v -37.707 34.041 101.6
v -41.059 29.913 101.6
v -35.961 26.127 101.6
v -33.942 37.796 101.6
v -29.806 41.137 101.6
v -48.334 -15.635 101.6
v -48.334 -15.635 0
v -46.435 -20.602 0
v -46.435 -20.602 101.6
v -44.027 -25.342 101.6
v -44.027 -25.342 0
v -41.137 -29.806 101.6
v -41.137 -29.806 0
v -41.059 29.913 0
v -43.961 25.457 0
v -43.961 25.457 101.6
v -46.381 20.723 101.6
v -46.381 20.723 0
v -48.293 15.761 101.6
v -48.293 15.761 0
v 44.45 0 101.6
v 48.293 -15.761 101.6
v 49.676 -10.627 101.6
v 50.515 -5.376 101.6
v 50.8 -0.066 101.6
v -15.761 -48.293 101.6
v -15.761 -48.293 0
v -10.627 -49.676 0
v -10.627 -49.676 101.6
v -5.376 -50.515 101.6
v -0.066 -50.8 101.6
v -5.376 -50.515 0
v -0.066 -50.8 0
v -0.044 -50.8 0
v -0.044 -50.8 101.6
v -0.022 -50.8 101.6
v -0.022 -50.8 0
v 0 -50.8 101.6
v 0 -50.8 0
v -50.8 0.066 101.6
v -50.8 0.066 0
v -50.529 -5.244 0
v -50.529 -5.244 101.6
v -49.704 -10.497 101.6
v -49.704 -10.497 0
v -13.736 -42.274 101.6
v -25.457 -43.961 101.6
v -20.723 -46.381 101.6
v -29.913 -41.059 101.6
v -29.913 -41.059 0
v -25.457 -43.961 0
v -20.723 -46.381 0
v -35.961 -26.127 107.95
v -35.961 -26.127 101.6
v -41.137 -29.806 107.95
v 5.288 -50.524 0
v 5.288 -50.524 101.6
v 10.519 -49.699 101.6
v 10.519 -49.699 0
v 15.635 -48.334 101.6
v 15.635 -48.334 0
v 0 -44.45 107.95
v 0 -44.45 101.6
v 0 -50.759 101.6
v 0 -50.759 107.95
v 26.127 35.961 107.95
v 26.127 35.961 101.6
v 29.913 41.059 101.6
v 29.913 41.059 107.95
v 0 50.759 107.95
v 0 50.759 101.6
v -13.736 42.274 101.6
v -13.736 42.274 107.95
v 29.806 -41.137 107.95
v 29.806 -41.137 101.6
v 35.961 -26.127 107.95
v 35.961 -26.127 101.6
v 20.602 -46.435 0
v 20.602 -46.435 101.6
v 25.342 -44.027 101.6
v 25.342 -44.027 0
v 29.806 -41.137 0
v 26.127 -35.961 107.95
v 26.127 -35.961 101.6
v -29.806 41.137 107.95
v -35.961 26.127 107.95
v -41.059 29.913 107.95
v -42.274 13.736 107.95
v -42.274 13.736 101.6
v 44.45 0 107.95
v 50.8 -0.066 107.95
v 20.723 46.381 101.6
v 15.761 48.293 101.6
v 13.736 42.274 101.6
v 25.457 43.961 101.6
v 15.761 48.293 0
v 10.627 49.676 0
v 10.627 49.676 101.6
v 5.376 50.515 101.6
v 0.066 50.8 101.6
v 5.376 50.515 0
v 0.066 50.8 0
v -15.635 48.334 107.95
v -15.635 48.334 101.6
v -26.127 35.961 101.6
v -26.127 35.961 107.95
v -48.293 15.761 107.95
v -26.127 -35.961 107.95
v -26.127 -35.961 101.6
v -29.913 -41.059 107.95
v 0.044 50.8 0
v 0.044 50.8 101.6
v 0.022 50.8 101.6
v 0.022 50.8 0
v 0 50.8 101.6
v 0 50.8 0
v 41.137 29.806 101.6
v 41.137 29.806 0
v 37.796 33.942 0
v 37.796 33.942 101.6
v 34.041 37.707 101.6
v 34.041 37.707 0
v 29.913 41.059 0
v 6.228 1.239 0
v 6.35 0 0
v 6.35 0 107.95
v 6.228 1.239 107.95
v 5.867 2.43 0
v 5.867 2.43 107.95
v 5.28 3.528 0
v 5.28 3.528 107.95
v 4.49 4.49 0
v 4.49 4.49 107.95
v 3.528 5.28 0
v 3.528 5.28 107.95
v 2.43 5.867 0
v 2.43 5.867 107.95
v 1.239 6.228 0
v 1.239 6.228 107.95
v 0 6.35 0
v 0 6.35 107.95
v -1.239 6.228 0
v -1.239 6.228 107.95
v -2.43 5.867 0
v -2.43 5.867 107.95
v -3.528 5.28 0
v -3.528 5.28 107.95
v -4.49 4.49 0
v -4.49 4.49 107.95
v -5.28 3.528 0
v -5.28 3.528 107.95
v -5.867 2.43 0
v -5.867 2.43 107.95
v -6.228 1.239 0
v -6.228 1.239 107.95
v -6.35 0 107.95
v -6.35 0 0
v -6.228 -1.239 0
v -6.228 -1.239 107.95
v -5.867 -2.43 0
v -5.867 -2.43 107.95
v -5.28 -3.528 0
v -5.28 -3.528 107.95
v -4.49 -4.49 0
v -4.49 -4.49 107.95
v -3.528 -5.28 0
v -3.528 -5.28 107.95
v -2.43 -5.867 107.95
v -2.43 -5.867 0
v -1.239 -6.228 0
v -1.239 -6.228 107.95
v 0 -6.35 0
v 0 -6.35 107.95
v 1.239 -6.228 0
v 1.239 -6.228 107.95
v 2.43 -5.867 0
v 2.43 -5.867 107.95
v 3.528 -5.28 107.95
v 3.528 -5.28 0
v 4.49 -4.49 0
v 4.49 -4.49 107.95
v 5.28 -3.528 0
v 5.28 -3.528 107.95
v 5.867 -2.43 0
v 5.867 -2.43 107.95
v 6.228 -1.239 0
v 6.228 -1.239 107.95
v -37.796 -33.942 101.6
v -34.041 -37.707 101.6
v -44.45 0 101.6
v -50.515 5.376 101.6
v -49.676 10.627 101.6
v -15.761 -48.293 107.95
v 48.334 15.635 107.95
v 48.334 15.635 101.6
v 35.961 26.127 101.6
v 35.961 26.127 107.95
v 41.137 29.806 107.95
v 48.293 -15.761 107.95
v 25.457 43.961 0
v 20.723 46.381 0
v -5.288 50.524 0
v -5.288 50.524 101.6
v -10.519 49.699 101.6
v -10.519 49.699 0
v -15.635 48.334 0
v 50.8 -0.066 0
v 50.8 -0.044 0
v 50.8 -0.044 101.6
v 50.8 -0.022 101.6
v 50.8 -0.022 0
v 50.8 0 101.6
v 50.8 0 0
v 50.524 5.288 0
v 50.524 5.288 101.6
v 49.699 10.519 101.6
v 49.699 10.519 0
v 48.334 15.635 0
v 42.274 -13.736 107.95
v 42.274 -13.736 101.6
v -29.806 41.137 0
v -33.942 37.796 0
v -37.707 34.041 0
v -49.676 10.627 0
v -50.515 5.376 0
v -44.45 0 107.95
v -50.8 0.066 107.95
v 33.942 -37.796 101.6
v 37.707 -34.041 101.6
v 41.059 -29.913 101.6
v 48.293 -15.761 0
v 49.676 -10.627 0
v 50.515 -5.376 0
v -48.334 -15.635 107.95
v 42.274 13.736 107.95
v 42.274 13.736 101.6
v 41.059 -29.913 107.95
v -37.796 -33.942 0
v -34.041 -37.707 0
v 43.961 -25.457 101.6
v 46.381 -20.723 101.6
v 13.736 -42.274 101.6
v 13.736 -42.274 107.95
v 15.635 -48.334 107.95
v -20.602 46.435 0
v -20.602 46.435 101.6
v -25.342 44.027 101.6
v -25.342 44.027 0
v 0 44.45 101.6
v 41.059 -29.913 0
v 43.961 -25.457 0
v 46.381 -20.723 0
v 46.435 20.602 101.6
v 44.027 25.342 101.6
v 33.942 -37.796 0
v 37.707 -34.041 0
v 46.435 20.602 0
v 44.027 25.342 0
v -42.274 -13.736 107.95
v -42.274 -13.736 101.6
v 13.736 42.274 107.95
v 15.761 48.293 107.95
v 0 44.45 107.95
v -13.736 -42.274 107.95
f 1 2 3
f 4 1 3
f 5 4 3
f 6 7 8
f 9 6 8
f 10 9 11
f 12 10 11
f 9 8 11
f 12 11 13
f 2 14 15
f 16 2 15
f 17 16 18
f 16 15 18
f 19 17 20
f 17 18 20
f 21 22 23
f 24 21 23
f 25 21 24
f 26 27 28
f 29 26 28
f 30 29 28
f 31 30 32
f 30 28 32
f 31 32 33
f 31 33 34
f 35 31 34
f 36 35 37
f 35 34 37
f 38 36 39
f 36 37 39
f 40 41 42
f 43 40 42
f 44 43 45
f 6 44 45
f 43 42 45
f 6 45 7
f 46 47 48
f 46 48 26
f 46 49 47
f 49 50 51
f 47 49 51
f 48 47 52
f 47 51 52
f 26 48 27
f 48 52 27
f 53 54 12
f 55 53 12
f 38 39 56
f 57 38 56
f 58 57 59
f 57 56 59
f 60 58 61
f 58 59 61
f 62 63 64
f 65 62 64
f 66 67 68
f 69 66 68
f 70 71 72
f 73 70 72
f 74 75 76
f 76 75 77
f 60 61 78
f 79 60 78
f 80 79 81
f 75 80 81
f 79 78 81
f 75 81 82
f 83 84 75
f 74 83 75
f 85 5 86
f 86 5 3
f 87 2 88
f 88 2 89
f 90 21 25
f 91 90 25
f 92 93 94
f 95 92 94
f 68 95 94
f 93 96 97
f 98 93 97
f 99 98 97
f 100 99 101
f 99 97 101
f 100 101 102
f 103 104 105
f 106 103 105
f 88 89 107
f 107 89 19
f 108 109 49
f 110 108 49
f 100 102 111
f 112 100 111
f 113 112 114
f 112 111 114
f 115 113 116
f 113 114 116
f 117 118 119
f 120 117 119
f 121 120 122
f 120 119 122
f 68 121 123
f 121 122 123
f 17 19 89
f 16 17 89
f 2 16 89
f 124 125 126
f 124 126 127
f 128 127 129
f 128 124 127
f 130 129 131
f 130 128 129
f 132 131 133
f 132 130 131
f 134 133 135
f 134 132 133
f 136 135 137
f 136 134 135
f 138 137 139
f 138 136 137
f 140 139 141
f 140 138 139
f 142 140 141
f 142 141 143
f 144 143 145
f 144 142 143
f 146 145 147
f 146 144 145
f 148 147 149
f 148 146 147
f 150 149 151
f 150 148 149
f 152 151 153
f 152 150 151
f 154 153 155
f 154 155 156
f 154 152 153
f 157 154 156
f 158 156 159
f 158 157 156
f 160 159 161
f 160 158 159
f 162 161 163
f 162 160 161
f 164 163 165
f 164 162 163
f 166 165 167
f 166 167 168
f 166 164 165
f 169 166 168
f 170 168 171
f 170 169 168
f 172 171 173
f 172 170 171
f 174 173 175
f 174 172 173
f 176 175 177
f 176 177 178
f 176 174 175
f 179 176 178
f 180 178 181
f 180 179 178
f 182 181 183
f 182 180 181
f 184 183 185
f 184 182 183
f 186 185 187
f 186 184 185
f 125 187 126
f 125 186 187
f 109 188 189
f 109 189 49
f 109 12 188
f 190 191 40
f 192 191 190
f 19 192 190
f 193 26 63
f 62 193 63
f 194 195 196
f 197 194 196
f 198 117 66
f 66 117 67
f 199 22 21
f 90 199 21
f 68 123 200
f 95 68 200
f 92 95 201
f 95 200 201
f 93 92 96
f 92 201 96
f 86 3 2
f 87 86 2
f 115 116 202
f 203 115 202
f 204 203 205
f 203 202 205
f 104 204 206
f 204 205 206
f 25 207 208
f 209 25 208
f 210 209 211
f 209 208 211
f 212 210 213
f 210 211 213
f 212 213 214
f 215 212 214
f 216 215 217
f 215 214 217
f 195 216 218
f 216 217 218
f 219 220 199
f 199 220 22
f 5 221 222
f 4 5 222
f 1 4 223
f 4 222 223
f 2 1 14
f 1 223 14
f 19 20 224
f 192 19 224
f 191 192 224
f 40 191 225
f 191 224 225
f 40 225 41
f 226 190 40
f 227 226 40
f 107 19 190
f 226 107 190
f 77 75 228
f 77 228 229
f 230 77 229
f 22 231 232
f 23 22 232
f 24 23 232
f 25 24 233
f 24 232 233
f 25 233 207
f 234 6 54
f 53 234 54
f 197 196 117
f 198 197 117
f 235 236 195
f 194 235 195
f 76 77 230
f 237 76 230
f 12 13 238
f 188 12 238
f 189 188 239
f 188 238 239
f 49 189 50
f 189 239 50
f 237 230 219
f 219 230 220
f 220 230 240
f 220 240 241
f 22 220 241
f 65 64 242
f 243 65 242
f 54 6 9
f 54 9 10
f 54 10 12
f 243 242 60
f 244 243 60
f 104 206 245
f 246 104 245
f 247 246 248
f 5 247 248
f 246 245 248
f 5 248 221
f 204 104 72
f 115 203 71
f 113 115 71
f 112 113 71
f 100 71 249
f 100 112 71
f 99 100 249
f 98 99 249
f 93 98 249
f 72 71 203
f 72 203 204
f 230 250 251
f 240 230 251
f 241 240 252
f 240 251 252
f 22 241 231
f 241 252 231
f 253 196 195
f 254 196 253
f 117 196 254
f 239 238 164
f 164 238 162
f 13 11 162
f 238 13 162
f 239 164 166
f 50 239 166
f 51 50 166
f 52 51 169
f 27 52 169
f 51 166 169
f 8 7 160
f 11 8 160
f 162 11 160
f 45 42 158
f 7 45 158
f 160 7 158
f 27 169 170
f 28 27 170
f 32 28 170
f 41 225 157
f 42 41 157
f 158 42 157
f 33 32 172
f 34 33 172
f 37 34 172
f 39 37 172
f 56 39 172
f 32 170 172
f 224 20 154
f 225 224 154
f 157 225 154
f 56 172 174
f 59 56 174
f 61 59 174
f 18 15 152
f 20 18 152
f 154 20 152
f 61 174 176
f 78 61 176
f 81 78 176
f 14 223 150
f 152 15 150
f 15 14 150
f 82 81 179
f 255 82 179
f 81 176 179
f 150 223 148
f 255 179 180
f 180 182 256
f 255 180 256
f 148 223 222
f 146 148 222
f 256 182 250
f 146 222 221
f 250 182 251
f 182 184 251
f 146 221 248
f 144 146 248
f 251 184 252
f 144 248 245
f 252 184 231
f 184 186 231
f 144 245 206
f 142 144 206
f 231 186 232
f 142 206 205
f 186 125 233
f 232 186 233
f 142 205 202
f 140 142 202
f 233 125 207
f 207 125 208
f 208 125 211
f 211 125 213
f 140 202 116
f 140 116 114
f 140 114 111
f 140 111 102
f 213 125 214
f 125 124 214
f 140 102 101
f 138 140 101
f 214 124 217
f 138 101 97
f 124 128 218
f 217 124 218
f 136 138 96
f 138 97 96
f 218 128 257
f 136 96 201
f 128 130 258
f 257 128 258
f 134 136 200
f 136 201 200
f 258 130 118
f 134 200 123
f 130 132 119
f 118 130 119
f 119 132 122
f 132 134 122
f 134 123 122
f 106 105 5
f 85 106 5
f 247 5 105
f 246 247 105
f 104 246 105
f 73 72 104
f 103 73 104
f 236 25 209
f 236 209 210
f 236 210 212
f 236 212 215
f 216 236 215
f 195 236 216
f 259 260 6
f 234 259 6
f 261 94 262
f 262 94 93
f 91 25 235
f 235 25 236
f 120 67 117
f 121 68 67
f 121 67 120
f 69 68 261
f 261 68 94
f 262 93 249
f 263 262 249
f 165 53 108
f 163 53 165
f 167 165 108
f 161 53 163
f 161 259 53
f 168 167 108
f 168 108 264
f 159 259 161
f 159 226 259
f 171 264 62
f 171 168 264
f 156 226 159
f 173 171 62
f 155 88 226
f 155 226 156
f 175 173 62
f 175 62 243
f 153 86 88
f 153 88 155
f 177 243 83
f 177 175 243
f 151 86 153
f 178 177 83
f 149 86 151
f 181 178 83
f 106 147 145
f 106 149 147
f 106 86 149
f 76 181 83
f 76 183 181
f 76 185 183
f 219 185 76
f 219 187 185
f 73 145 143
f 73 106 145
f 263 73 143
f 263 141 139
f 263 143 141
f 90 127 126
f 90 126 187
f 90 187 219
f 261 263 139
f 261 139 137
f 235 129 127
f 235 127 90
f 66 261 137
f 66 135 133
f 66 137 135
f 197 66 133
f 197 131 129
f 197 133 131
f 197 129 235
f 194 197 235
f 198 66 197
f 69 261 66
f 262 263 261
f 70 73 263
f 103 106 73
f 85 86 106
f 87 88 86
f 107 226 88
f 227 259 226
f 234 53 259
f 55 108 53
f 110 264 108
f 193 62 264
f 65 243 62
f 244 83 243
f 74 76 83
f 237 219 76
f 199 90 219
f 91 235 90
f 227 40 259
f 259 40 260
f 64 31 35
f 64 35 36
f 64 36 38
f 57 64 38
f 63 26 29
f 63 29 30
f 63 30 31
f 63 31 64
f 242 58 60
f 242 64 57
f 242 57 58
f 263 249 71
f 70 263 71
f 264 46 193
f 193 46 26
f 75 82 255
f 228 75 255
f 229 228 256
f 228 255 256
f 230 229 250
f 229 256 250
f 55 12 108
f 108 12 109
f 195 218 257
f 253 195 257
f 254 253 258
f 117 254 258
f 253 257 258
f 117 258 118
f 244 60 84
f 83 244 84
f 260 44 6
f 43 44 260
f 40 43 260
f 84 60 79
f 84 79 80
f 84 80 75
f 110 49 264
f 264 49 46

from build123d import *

# Parameters (mm, degrees)
F0_R     = 6.35
F1_DEPTH = 107.95
F2_DEPTH = 101.6


with BuildPart() as f1:
    # F0 (on Top) → F1 (new body)
    with BuildSketch(Plane.XY):
        Polygon((42.274462, 13.735805), (48.334151, 15.634893), (35.960805, 26.127054), (41.137061, 29.805741), (26.127054, 35.960805), (29.91319, 41.058995), (13.735805, 42.274462), (15.761207, 48.293109), (0, 44.45), (0, 50.758937), (-13.735805, 42.274462), (-15.634893, 48.334151), (-26.127054, 35.960805), (-29.805741, 41.137061), (-35.960805, 26.127054), (-41.058995, 29.91319), (-42.274462, 13.735805), (-48.293109, 15.761207), (-44.45, 0), (-50.799957, 0.066407), (-42.274462, -13.735805), (-48.334151, -15.634893), (-35.960805, -26.127054), (-41.137061, -29.805741), (-26.127054, -35.960805), (-29.91319, -41.058995), (-13.735805, -42.274462), (-15.761207, -48.293109), (0, -44.45), (0, -50.758937), (13.735805, -42.274462), (15.634893, -48.334151), (26.127054, -35.960805), (29.805741, -41.137061), (35.960805, -26.127054), (41.058995, -29.91319), (42.274462, -13.735805), (48.293109, -15.761207), (44.45, 0), (50.799957, -0.066407), align=None)
        Circle(F0_R, mode=Mode.SUBTRACT)
    extrude(amount=F1_DEPTH)

    # F0 (on Top) → F2 (join)
    with BuildSketch(Plane.XY):
        with BuildLine():
            ThreePointArc((50.799957, -0.066407), (50.799989, -0.033204), (50.8, 0))
            ThreePointArc((50.8, 0), (50.179751, 7.914074), (48.334151, 15.634893))
            Line((48.334151, 15.634893), (42.274462, 13.735805))
            Line((42.274462, 13.735805), (50.799957, -0.066407))
        make_face()
        with BuildLine():
            Line((35.960805, 26.127054), (48.334151, 15.634893))
            ThreePointArc((48.334151, 15.634893), (45.293241, 23.003528), (41.137061, 29.805741))
            Line((41.137061, 29.805741), (35.960805, 26.127054))
        make_face()
        with BuildLine():
            ThreePointArc((48.293109, -15.761207), (50.164136, -8.012454), (50.799957, -0.066407))
            Line((50.799957, -0.066407), (44.45, 0))
            Line((44.45, 0), (48.293109, -15.761207))
        make_face()
        with BuildLine():
            Line((26.127054, 35.960805), (41.137061, 29.805741))
            ThreePointArc((41.137061, 29.805741), (35.967951, 35.874037), (29.91319, 41.058995))
            Line((29.91319, 41.058995), (26.127054, 35.960805))
        make_face()
        with BuildLine():
            ThreePointArc((41.058995, -29.91319), (45.232944, -23.121867), (48.293109, -15.761207))
            Line((48.293109, -15.761207), (42.274462, -13.735805))
            Line((42.274462, -13.735805), (41.058995, -29.91319))
        make_face()
        with BuildLine():
            Line((13.735805, 42.274462), (29.91319, 41.058995))
            ThreePointArc((29.91319, 41.058995), (23.121867, 45.232944), (15.761207, 48.293109))
            Line((15.761207, 48.293109), (13.735805, 42.274462))
        make_face()
        with BuildLine():
            ThreePointArc((29.805741, -41.137061), (35.874037, -35.967951), (41.058995, -29.91319))
            Line((41.058995, -29.91319), (35.960805, -26.127054))
            Line((35.960805, -26.127054), (29.805741, -41.137061))
        make_face()
        with BuildLine():
            Line((0, 44.45), (15.761207, 48.293109))
            ThreePointArc((15.761207, 48.293109), (8.012454, 50.164136), (0.066407, 50.799957))
            Line((0.066407, 50.799957), (0, 50.758937))
            Line((0, 50.758937), (0, 44.45))
        make_face()
        with BuildLine():
            ThreePointArc((15.634893, -48.334151), (23.003528, -45.293241), (29.805741, -41.137061))
            Line((29.805741, -41.137061), (26.127054, -35.960805))
            Line((26.127054, -35.960805), (15.634893, -48.334151))
        make_face()
        with BuildLine():
            Line((0, 50.758937), (0.066407, 50.799957))
            ThreePointArc((0.066407, 50.799957), (0.033204, 50.799989), (0, 50.8))
            Line((0, 50.8), (0, 50.758937))
        make_face()
        with BuildLine():
            ThreePointArc((0, -50.8), (7.914074, -50.179751), (15.634893, -48.334151))
            Line((15.634893, -48.334151), (13.735805, -42.274462))
            Line((13.735805, -42.274462), (0, -50.758937))
            Line((0, -50.758937), (0, -50.8))
        make_face()
        with BuildLine():
            Line((0, 50.758937), (0, 50.8))
            ThreePointArc((0, 50.8), (-7.914074, 50.179751), (-15.634893, 48.334151))
            Line((-15.634893, 48.334151), (-13.735805, 42.274462))
            Line((-13.735805, 42.274462), (0, 50.758937))
        make_face()
        with BuildLine():
            ThreePointArc((-0.066407, -50.799957), (-0.033204, -50.799989), (0, -50.8))
            Line((0, -50.8), (0, -50.758937))
            Line((0, -50.758937), (-0.066407, -50.799957))
        make_face()
        with BuildLine():
            Line((-26.127054, 35.960805), (-15.634893, 48.334151))
            ThreePointArc((-15.634893, 48.334151), (-23.003528, 45.293241), (-29.805741, 41.137061))
            Line((-29.805741, 41.137061), (-26.127054, 35.960805))
        make_face()
        with BuildLine():
            ThreePointArc((-15.761207, -48.293109), (-8.012454, -50.164136), (-0.066407, -50.799957))
            Line((-0.066407, -50.799957), (0, -50.758937))
            Line((0, -50.758937), (0, -44.45))
            Line((0, -44.45), (-15.761207, -48.293109))
        make_face()
        with BuildLine():
            Line((-35.960805, 26.127054), (-29.805741, 41.137061))
            ThreePointArc((-29.805741, 41.137061), (-35.874037, 35.967951), (-41.058995, 29.91319))
            Line((-41.058995, 29.91319), (-35.960805, 26.127054))
        make_face()
        with BuildLine():
            ThreePointArc((-29.91319, -41.058995), (-23.121867, -45.232944), (-15.761207, -48.293109))
            Line((-15.761207, -48.293109), (-13.735805, -42.274462))
            Line((-13.735805, -42.274462), (-29.91319, -41.058995))
        make_face()
        with BuildLine():
            Line((-42.274462, 13.735805), (-41.058995, 29.91319))
            ThreePointArc((-41.058995, 29.91319), (-45.232944, 23.121867), (-48.293109, 15.761207))
            Line((-48.293109, 15.761207), (-42.274462, 13.735805))
        make_face()
        with BuildLine():
            ThreePointArc((-41.137061, -29.805741), (-35.967951, -35.874037), (-29.91319, -41.058995))
            Line((-29.91319, -41.058995), (-26.127054, -35.960805))
            Line((-26.127054, -35.960805), (-41.137061, -29.805741))
        make_face()
        with BuildLine():
            Line((-44.45, 0), (-48.293109, 15.761207))
            ThreePointArc((-48.293109, 15.761207), (-50.164136, 8.012454), (-50.799957, 0.066407))
            Line((-50.799957, 0.066407), (-44.45, 0))
        make_face()
        with BuildLine():
            ThreePointArc((-48.334151, -15.634893), (-45.293241, -23.003528), (-41.137061, -29.805741))
            Line((-41.137061, -29.805741), (-35.960805, -26.127054))
            Line((-35.960805, -26.127054), (-48.334151, -15.634893))
        make_face()
        with BuildLine():
            Line((-42.274462, -13.735805), (-50.799957, 0.066407))
            ThreePointArc((-50.799957, 0.066407), (-50.184913, -7.881274), (-48.334151, -15.634893))
            Line((-48.334151, -15.634893), (-42.274462, -13.735805))
        make_face()
    extrude(amount=F2_DEPTH)


solid = f1.part
